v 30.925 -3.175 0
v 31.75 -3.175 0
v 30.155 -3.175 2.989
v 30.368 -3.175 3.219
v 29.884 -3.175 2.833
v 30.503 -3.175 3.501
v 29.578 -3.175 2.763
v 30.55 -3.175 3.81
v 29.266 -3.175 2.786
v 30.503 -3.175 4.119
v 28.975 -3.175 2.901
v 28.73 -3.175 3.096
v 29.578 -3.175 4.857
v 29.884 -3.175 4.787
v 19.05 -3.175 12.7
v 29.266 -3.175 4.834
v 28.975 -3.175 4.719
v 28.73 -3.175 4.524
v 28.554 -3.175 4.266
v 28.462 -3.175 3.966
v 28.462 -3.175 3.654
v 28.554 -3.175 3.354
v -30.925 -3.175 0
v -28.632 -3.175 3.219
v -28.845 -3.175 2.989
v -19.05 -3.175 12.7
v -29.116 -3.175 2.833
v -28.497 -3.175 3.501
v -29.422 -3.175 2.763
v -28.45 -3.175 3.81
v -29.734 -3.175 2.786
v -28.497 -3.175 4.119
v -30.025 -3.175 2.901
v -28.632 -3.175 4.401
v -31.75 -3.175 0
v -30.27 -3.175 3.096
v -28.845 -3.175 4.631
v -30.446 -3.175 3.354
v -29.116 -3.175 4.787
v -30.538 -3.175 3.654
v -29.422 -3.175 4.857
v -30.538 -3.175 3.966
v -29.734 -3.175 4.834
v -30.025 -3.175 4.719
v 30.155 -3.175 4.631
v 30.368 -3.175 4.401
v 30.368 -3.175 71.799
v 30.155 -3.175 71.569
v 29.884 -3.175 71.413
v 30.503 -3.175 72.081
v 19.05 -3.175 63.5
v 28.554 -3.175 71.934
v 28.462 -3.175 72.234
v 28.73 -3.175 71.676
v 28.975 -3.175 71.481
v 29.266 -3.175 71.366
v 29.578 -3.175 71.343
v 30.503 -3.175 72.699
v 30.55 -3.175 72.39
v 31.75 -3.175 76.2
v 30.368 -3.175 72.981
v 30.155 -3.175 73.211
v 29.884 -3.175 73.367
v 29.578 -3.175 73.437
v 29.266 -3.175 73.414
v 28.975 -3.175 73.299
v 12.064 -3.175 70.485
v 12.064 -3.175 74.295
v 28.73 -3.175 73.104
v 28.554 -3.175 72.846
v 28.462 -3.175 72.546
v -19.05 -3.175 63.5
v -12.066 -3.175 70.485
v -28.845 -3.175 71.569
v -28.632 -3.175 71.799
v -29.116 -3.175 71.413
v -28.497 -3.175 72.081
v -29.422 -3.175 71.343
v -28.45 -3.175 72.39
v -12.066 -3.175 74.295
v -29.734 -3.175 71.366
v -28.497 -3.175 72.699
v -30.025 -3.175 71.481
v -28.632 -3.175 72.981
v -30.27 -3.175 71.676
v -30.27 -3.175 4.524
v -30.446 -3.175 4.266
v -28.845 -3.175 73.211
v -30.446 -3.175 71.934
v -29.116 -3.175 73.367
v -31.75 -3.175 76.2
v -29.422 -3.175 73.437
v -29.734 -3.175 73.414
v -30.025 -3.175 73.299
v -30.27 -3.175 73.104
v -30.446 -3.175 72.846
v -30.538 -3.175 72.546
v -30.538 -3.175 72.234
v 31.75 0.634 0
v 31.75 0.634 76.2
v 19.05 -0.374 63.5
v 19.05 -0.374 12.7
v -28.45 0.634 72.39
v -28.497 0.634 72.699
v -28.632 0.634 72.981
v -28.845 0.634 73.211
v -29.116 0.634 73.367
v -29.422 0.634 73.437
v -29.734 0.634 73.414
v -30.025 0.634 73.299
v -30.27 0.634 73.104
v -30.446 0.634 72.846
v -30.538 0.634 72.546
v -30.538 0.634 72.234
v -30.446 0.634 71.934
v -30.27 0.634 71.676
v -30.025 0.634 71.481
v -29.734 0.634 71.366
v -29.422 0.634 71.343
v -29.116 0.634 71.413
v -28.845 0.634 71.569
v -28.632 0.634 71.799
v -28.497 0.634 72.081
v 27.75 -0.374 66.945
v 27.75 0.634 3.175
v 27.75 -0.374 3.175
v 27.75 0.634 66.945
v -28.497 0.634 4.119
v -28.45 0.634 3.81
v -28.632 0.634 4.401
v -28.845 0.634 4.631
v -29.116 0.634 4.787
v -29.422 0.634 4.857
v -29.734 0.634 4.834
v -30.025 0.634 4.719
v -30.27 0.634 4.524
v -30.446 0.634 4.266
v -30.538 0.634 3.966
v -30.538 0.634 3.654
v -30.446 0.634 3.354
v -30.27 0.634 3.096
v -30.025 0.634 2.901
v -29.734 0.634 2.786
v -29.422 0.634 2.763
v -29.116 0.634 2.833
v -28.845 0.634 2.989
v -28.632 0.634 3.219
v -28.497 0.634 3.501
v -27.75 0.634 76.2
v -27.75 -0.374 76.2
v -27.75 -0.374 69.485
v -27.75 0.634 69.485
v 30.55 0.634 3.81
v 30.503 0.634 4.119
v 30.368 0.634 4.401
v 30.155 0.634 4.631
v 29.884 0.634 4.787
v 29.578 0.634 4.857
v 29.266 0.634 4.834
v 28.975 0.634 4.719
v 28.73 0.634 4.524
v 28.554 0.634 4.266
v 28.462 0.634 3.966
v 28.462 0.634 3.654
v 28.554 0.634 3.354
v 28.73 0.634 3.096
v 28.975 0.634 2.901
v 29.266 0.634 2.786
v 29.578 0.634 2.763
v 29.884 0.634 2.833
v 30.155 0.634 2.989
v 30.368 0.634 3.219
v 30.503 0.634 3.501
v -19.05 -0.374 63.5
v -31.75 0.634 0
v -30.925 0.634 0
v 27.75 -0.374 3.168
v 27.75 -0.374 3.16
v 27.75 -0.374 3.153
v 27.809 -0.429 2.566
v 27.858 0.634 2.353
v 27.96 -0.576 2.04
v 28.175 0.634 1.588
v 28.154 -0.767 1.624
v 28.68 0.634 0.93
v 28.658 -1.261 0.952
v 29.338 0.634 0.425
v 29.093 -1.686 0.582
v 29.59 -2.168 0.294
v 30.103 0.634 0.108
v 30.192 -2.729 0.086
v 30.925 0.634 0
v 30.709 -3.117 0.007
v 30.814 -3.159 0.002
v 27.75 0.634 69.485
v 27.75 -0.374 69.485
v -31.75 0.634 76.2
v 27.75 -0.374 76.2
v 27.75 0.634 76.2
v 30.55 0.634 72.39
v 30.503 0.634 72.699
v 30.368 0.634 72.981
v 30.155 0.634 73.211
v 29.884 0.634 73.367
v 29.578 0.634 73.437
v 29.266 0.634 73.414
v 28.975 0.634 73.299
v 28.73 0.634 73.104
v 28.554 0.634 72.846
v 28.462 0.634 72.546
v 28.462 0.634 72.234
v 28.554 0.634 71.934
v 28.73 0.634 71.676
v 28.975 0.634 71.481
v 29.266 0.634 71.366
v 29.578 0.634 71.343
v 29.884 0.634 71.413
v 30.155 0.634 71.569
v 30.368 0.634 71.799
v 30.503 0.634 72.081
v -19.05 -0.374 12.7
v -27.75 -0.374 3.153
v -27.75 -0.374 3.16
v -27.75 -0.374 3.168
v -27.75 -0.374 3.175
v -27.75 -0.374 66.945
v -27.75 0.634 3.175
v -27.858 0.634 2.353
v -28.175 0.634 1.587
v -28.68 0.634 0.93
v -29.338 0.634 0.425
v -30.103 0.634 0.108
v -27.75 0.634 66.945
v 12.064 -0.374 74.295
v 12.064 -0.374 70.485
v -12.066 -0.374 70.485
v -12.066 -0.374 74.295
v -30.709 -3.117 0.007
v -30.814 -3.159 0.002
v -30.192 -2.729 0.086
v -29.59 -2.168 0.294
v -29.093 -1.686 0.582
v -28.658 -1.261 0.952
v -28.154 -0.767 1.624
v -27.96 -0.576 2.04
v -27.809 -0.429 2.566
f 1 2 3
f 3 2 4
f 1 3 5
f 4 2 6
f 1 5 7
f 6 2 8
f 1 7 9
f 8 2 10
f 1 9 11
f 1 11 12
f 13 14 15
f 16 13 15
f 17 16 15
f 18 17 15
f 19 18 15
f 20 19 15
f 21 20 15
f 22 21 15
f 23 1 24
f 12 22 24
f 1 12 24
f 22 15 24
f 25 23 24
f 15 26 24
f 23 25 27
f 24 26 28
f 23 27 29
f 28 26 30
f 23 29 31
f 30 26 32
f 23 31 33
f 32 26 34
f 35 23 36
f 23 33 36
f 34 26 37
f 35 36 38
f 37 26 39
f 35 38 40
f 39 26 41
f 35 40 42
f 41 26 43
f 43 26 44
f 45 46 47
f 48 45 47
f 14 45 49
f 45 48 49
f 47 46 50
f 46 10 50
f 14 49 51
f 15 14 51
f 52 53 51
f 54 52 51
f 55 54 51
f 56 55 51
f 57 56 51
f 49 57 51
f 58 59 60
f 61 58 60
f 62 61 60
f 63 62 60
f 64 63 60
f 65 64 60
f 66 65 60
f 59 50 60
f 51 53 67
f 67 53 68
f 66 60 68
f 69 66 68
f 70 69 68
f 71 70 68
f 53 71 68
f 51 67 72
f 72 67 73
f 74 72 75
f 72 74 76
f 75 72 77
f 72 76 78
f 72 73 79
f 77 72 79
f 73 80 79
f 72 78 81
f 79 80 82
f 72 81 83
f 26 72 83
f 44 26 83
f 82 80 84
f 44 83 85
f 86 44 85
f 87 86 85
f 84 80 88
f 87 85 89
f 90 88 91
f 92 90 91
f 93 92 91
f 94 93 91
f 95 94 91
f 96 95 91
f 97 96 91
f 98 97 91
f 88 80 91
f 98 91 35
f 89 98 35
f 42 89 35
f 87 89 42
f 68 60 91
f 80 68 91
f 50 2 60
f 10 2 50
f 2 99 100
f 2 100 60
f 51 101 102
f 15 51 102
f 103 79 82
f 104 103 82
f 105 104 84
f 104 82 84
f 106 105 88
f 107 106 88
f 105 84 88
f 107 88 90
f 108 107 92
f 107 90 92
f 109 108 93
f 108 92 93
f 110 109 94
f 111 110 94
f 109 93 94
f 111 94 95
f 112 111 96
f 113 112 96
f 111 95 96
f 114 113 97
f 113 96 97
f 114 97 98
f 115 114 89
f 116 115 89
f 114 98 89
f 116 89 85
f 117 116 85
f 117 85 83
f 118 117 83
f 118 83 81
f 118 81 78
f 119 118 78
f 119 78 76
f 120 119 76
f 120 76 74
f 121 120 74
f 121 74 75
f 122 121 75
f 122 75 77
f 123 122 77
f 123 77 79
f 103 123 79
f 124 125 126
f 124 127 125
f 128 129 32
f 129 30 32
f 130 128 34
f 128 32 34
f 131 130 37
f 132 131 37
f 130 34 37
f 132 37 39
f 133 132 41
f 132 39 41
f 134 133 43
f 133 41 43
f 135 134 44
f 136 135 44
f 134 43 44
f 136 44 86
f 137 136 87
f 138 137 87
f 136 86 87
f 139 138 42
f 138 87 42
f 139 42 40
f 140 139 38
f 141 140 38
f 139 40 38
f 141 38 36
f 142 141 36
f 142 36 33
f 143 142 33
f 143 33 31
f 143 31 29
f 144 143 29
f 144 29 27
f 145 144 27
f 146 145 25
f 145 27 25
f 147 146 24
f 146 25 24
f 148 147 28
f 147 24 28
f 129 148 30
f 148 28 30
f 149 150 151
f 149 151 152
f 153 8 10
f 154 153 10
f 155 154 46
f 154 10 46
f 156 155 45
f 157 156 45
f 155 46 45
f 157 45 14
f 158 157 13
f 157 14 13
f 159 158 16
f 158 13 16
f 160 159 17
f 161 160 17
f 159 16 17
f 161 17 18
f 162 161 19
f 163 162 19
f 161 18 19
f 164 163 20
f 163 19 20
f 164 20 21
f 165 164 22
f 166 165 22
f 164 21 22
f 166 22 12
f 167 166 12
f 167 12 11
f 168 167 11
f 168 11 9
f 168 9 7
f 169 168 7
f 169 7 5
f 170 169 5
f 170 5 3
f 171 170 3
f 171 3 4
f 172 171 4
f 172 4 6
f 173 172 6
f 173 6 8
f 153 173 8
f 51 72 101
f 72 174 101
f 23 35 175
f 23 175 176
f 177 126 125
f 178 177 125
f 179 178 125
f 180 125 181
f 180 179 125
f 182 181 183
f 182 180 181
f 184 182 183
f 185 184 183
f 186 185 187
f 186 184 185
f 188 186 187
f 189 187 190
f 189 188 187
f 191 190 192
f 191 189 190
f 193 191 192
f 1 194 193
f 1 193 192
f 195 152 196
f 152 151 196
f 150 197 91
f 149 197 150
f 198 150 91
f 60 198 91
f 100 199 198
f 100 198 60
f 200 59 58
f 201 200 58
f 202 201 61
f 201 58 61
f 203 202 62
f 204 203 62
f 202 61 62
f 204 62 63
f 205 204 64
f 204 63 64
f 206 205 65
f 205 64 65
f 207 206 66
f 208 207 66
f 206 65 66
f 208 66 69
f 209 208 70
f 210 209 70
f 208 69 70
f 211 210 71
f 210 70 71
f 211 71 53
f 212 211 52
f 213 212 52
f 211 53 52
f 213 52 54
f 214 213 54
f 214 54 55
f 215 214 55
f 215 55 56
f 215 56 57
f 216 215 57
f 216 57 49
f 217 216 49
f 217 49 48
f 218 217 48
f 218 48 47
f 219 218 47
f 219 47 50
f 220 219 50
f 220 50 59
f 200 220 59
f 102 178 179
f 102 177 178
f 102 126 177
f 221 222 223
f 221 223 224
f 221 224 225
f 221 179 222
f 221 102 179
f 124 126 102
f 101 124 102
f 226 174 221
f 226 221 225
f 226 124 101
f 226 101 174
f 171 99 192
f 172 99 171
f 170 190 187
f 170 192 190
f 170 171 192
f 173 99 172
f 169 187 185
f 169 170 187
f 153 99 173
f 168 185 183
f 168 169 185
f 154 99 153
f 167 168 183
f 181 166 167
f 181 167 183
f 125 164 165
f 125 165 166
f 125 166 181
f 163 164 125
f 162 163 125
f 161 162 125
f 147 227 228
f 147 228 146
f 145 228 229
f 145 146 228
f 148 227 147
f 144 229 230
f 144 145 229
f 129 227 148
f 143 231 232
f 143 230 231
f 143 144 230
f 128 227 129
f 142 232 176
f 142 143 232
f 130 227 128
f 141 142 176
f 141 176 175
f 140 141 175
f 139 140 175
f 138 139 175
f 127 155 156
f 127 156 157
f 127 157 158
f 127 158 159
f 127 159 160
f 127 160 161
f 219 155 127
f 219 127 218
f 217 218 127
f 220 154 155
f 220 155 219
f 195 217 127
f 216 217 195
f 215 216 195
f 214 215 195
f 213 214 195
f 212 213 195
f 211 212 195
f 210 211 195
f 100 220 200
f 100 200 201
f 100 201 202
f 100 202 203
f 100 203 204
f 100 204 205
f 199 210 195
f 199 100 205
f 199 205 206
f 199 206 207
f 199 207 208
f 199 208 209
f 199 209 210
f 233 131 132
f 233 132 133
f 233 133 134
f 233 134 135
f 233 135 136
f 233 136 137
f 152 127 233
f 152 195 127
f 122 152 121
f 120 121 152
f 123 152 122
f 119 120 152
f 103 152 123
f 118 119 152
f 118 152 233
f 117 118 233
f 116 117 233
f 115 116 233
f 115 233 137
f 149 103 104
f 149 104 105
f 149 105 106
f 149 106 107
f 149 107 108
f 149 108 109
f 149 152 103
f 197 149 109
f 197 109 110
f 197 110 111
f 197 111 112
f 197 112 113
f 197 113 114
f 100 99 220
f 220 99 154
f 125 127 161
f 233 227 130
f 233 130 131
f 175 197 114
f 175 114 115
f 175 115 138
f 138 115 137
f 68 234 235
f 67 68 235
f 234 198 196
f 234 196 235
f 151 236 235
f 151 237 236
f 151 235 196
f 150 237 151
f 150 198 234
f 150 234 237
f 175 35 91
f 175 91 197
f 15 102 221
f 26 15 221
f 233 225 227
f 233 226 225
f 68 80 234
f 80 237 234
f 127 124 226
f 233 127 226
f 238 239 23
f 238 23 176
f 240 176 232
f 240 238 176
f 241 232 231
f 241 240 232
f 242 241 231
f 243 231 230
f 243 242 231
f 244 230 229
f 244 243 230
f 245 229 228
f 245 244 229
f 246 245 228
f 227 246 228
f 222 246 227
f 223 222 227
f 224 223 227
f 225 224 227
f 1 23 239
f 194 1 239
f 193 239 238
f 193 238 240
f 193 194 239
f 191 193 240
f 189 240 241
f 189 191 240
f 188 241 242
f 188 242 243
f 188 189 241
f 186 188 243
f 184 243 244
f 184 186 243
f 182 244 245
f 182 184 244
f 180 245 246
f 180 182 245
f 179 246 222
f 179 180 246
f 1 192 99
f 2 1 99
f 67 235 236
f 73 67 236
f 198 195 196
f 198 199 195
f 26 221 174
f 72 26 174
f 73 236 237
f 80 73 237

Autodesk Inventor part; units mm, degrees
ref_plane "YZ Plane" through (0, 0, 0) normal (1, 0, 0) x (0, 1, 0)
ref_plane "XZ Plane" through (0, 0, 0) normal (0, 1, 0) x (-1, 0, 0)
ref_plane "XY Plane" through (0, 0, 0) normal (0, 0, 1) x (1, 0, 0)
sketch "Sketch1" plane through (0, 0, 0) normal (0, 0, 1) x (1, 0, 0)
  line L0 (-31.75, 5.08) -> (31.75, 5.08)
  line L1 (31.75, 5.08) -> (31.75, -5.08)
  line L2 (31.75, -5.08) -> (-31.75, -5.08)
  line L3 (-31.75, -5.08) -> (-31.75, 5.08)
  point P0 (0, 0)
  dimension "d0" = 63.5
  dimension "d3" = 31.75
  dimension "d4" = 10.16
  dimension "d17" = 5.08
extrude "Extrusion1" add sketch "Sketch1" along normal blind 76.2
sketch "Sketch3" plane through (0, 0, 76.2) normal (0, 0, 1) x (1, 0, 0)
  line L0 (-27.75, 0.3875) -> (27.75, 0.3875)
  line L1 (27.75, 0.3875) -> (27.75, -0.3745)
  line L2 (27.75, -0.3745) -> (-27.75, -0.3745)
  line L3 (-27.75, -0.3745) -> (-27.75, 0.3875)
  line L4 (-31.75, 5.08) -> (-31.75, -5.08) projected
  point P0 (0, 0)
  point P1 (-27.75, 0.0065)
  dimension "d6" = 0.762
  dimension "d7" = 55.5
  dimension "d8" = 4
extrude "Extrusion2" cut sketch "Sketch3" against normal blind 85.1
sketch "Sketch8" plane through (0, 0, 76.2) normal (0, 0, 1) x (1, 0, 0)
  line L0 (27.75, 0.3875) -> (27.75, -0.3745) projected
  line L1 (27.75, -0.3745) -> (-27.75, -0.3745) projected
  line L2 (-27.75, -0.3745) -> (-27.75, 0.3875) projected
  line L3 (-27.75, 0.3875) -> (27.75, 0.3875) projected
  line L4 (-31.75, -5.08) -> (31.75, -5.08) projected
  line L5 (31.75, -5.08) -> (31.75, 5.08) projected
  line L6 (31.75, 5.08) -> (-31.75, 5.08) projected
  line L7 (-31.75, 5.08) -> (-31.75, -5.08) projected
  line L8 (-31.75, 5.08) -> (31.75, 5.08)
  line L9 (31.75, 5.08) -> (31.75, 0.3875)
  line L10 (31.75, 0.3875) -> (-31.75, 0.3875)
  line L11 (-31.75, 0.3875) -> (-31.75, 5.08)
  point P0 (0, 0)
  point P1 (-31.75, 0.3875)
  dimension "d30" = 0
extrude "Extrusion6" cut sketch "Sketch8" against normal blind 76.2 contours L3 L10 L7 L6 L5
sketch "Sketch9" plane through (0, 0, 76.2) normal (0, 0, 1) x (1, 0, 0)
  line L0 (-31.75, 0.3875) -> (-31.75, -5.08) projected
  line L1 (31.75, -5.08) -> (31.75, 0.3875) projected
  line L2 (-31.75, -5.08) -> (31.75, -5.08)
  line L3 (31.75, -5.08) -> (31.75, -3.175)
  line L4 (31.75, -3.175) -> (-31.75, -3.175)
  line L5 (-31.75, -3.175) -> (-31.75, -5.08)
  point P0 (0, 0)
  dimension "d33" = 1.905
extrude "Extrusion7" cut sketch "Sketch9" against normal blind 76.2
sketch "Sketch10" plane through (-27.75, -0.3745, 76.2) normal (0, 1, 0) x (1, 0, 0)
  line L0 (59.5, 76.2) -> (-4, 76.2) projected
  line L1 (-4, 76.2) -> (59.5, 76.2)
  line L2 (59.5, 76.2) -> (59.5, 0)
  line L3 (59.5, 0) -> (-4, 0)
  line L4 (-4, 0) -> (-4, 76.2)
  line L5 (8.7, 12.7) -> (46.8, 12.7)
  line L6 (46.8, 12.7) -> (46.8, 63.5)
  line L7 (46.8, 63.5) -> (8.7, 63.5)
  line L8 (8.7, 63.5) -> (8.7, 12.7)
  dimension "d46" = 12.7
extrude "Extrusion8" cut sketch "Sketch10" against normal blind 25.4 contours L8 L7 L6 L5
fillet "Fillet3" radius 3.175 3 edges at (0, -0.3745, 0) (-27.75, 0.0065, 0) (27.75, 0.0065, 0)
sketch "Sketch11" plane through (-27.75, -0.3745, 76.2) normal (0, 1, 0) x (1, 0, 0)
  line L0 (15.6845, 1.905) -> (39.8145, 1.905)
  line L1 (39.8145, 1.905) -> (39.8145, 5.715)
  line L2 (39.8145, 5.715) -> (15.6845, 5.715)
  line L3 (15.6845, 5.715) -> (15.6845, 1.905)
  line L4 (55.5, 0) -> (0, 0) projected
  line L5 (0, 0) -> (0, 73.025) projected
  line L6 (-4, 0) -> (-4, 76.2) projected
  point P0 (27.75, 76.2)
  dimension "d47" = 1.905
  dimension "d48" = 3.81
  dimension "d51" = 24.13
  dimension "d52" = 15.6845
  dimension "d67" = 19.6845
extrude "Extrusion9" cut sketch "Sketch11" against normal blind 25.4
sketch "Sketch13" plane through (-31.75, -3.175, 76.2) normal (0, -1, 0) x (1, 0, 0)
  circle A0 centre (61.25, -3.81) radius 1.05
  line L0 (63.5, 0) -> (59, 0)
  circle A1 centre (2.25, -3.81) radius 1.05
  line L1 (4.5, 0) -> (0, 0)
  circle A2 centre (61.25, -72.39) radius 1.05
  line L2 (59, -76.2) -> (63.5, -76.2)
  line L3 (59, 0) -> (59, -76.2)
  circle A3 centre (2.25, -72.39) radius 1.05
  line L4 (0, 0) -> (0, -76.2)
  line L5 (0, -76.2) -> (4.5, -76.2)
  line L6 (50.8, -12.7) -> (50.8, -63.5)
  line L7 (50.8, -63.5) -> (12.7, -63.5)
  line L8 (12.7, -63.5) -> (12.7, -12.7)
  line L9 (12.7, -12.7) -> (50.8, -12.7)
  line L10 (63.5, 0) -> (0, 0)
  line L11 (0, 0) -> (0, -76.2)
  line L12 (63.5, -76.2) -> (0, -76.2)
  line L13 (63.5, 0) -> (63.5, -76.2)
  point P0 (31.75, -76.2)
  point P1 (31.75, -76.2)
  dimension "d53" = 2.1
  dimension "d54" = 3.81
  dimension "d55" = 2.25
  dimension "d56" = 2.25
  dimension "d57" = 2.1
  dimension "d58" = 3.81
  dimension "d59" = 2.1
  dimension "d60" = 2.1
  dimension "d61" = 3.81
  dimension "d62" = 3.81
  dimension "d63" = 2.25
  dimension "d64" = 2.25
extrude "Extrusion10" cut sketch "Sketch13" against normal blind 25.4 contours A0 | A1 | A2 | A3
sketch "Sketch14" plane through (-31.75, 0.3875, 76.2) normal (0, 1, 0) x (1, 0, 0)
  circle A0 centre (2.25, 3.81) radius 1.05 projected
  circle A1 centre (2.25, 72.39) radius 1.05 projected
  arc A2 (4, 73.025) -> (0.825, 76.2) centre (0.825, 73.025) ccw projected
  line L0 (0, 76.2) -> (0.825, 76.2) projected
  line L1 (0, 0) -> (0, 76.2) projected
  line L2 (4, 0) -> (0, 0) projected
  line L3 (4, 0) -> (4, 73.025) projected
  circle A3 centre (61.25, 3.81) radius 1.05 projected
  circle A4 centre (61.25, 72.39) radius 1.05 projected
  arc A5 (62.675, 76.2) -> (59.5, 73.025) centre (62.675, 73.025) ccw projected
  line L4 (59.5, 0) -> (59.5, 73.025) projected
  line L5 (63.5, 0) -> (59.5, 0) projected
  line L6 (63.5, 76.2) -> (63.5, 0) projected
  line L7 (62.675, 76.2) -> (63.5, 76.2) projected
  point P0 (31.75, 76.2)
extrude "Extrusion11" add sketch "Sketch14" along normal blind 0.5
sketch "Sketch15" plane through (-27.75, -0.3745, 76.2) normal (0, 1, 0) x (1, 0, 0)
  line L0 (0, 0) -> (0, 73.025) projected
  line L1 (0, 6.715) -> (55.7227, 6.715)
  line L2 (55.7227, 6.715) -> (55.7227, 9.255)
  line L3 (55.7227, 9.255) -> (0, 9.255)
  line L4 (0, 9.255) -> (0, 6.715)
  line L5 (15.6845, 5.715) -> (39.8145, 5.715) projected
  point P0 (27.75, 76.2)
  point P1 (0, 9.255)
  dimension "d72" = 2.54
  dimension "d77" = 1
extrude "Extrusion12" add sketch "Sketch15" along normal blind 1.3
sketch "Sketch16" plane through (0, 0, 76.2) normal (0, 0, 1) x (1, 0, 0)
  line L0 (31.75, -3.175) -> (31.75, 0.8875) projected
  line L1 (-36.1102, 11.8694) -> (32.0392, 11.8694)
  line L2 (32.0392, 11.8694) -> (32.0392, 0.6335)
  line L3 (32.0392, 0.6335) -> (-36.1102, 0.6335)
  line L4 (-36.1102, 0.6335) -> (-36.1102, 11.8694)
  line L5 (-31.75, 0.8875) -> (-27.75, 0.8875) projected
  point P0 (0, 0)
  dimension "d79" = 0.254
extrude "Extrusion13" cut sketch "Sketch16" against normal blind 254
sketch "Sketch18" plane through (0, 0, 0) normal (0, 0, -1) x (-1, 0, 0)
  line L0 (27.7501, -0.3745) -> (-27.7501, -0.3745) projected
  line L1 (27.75, 0.6335) -> (-27.75, 0.6335) projected
  point P0 (0, 0)
  dimension "d78" = 1.008
properties part number "Scanner_Test_Bot"
